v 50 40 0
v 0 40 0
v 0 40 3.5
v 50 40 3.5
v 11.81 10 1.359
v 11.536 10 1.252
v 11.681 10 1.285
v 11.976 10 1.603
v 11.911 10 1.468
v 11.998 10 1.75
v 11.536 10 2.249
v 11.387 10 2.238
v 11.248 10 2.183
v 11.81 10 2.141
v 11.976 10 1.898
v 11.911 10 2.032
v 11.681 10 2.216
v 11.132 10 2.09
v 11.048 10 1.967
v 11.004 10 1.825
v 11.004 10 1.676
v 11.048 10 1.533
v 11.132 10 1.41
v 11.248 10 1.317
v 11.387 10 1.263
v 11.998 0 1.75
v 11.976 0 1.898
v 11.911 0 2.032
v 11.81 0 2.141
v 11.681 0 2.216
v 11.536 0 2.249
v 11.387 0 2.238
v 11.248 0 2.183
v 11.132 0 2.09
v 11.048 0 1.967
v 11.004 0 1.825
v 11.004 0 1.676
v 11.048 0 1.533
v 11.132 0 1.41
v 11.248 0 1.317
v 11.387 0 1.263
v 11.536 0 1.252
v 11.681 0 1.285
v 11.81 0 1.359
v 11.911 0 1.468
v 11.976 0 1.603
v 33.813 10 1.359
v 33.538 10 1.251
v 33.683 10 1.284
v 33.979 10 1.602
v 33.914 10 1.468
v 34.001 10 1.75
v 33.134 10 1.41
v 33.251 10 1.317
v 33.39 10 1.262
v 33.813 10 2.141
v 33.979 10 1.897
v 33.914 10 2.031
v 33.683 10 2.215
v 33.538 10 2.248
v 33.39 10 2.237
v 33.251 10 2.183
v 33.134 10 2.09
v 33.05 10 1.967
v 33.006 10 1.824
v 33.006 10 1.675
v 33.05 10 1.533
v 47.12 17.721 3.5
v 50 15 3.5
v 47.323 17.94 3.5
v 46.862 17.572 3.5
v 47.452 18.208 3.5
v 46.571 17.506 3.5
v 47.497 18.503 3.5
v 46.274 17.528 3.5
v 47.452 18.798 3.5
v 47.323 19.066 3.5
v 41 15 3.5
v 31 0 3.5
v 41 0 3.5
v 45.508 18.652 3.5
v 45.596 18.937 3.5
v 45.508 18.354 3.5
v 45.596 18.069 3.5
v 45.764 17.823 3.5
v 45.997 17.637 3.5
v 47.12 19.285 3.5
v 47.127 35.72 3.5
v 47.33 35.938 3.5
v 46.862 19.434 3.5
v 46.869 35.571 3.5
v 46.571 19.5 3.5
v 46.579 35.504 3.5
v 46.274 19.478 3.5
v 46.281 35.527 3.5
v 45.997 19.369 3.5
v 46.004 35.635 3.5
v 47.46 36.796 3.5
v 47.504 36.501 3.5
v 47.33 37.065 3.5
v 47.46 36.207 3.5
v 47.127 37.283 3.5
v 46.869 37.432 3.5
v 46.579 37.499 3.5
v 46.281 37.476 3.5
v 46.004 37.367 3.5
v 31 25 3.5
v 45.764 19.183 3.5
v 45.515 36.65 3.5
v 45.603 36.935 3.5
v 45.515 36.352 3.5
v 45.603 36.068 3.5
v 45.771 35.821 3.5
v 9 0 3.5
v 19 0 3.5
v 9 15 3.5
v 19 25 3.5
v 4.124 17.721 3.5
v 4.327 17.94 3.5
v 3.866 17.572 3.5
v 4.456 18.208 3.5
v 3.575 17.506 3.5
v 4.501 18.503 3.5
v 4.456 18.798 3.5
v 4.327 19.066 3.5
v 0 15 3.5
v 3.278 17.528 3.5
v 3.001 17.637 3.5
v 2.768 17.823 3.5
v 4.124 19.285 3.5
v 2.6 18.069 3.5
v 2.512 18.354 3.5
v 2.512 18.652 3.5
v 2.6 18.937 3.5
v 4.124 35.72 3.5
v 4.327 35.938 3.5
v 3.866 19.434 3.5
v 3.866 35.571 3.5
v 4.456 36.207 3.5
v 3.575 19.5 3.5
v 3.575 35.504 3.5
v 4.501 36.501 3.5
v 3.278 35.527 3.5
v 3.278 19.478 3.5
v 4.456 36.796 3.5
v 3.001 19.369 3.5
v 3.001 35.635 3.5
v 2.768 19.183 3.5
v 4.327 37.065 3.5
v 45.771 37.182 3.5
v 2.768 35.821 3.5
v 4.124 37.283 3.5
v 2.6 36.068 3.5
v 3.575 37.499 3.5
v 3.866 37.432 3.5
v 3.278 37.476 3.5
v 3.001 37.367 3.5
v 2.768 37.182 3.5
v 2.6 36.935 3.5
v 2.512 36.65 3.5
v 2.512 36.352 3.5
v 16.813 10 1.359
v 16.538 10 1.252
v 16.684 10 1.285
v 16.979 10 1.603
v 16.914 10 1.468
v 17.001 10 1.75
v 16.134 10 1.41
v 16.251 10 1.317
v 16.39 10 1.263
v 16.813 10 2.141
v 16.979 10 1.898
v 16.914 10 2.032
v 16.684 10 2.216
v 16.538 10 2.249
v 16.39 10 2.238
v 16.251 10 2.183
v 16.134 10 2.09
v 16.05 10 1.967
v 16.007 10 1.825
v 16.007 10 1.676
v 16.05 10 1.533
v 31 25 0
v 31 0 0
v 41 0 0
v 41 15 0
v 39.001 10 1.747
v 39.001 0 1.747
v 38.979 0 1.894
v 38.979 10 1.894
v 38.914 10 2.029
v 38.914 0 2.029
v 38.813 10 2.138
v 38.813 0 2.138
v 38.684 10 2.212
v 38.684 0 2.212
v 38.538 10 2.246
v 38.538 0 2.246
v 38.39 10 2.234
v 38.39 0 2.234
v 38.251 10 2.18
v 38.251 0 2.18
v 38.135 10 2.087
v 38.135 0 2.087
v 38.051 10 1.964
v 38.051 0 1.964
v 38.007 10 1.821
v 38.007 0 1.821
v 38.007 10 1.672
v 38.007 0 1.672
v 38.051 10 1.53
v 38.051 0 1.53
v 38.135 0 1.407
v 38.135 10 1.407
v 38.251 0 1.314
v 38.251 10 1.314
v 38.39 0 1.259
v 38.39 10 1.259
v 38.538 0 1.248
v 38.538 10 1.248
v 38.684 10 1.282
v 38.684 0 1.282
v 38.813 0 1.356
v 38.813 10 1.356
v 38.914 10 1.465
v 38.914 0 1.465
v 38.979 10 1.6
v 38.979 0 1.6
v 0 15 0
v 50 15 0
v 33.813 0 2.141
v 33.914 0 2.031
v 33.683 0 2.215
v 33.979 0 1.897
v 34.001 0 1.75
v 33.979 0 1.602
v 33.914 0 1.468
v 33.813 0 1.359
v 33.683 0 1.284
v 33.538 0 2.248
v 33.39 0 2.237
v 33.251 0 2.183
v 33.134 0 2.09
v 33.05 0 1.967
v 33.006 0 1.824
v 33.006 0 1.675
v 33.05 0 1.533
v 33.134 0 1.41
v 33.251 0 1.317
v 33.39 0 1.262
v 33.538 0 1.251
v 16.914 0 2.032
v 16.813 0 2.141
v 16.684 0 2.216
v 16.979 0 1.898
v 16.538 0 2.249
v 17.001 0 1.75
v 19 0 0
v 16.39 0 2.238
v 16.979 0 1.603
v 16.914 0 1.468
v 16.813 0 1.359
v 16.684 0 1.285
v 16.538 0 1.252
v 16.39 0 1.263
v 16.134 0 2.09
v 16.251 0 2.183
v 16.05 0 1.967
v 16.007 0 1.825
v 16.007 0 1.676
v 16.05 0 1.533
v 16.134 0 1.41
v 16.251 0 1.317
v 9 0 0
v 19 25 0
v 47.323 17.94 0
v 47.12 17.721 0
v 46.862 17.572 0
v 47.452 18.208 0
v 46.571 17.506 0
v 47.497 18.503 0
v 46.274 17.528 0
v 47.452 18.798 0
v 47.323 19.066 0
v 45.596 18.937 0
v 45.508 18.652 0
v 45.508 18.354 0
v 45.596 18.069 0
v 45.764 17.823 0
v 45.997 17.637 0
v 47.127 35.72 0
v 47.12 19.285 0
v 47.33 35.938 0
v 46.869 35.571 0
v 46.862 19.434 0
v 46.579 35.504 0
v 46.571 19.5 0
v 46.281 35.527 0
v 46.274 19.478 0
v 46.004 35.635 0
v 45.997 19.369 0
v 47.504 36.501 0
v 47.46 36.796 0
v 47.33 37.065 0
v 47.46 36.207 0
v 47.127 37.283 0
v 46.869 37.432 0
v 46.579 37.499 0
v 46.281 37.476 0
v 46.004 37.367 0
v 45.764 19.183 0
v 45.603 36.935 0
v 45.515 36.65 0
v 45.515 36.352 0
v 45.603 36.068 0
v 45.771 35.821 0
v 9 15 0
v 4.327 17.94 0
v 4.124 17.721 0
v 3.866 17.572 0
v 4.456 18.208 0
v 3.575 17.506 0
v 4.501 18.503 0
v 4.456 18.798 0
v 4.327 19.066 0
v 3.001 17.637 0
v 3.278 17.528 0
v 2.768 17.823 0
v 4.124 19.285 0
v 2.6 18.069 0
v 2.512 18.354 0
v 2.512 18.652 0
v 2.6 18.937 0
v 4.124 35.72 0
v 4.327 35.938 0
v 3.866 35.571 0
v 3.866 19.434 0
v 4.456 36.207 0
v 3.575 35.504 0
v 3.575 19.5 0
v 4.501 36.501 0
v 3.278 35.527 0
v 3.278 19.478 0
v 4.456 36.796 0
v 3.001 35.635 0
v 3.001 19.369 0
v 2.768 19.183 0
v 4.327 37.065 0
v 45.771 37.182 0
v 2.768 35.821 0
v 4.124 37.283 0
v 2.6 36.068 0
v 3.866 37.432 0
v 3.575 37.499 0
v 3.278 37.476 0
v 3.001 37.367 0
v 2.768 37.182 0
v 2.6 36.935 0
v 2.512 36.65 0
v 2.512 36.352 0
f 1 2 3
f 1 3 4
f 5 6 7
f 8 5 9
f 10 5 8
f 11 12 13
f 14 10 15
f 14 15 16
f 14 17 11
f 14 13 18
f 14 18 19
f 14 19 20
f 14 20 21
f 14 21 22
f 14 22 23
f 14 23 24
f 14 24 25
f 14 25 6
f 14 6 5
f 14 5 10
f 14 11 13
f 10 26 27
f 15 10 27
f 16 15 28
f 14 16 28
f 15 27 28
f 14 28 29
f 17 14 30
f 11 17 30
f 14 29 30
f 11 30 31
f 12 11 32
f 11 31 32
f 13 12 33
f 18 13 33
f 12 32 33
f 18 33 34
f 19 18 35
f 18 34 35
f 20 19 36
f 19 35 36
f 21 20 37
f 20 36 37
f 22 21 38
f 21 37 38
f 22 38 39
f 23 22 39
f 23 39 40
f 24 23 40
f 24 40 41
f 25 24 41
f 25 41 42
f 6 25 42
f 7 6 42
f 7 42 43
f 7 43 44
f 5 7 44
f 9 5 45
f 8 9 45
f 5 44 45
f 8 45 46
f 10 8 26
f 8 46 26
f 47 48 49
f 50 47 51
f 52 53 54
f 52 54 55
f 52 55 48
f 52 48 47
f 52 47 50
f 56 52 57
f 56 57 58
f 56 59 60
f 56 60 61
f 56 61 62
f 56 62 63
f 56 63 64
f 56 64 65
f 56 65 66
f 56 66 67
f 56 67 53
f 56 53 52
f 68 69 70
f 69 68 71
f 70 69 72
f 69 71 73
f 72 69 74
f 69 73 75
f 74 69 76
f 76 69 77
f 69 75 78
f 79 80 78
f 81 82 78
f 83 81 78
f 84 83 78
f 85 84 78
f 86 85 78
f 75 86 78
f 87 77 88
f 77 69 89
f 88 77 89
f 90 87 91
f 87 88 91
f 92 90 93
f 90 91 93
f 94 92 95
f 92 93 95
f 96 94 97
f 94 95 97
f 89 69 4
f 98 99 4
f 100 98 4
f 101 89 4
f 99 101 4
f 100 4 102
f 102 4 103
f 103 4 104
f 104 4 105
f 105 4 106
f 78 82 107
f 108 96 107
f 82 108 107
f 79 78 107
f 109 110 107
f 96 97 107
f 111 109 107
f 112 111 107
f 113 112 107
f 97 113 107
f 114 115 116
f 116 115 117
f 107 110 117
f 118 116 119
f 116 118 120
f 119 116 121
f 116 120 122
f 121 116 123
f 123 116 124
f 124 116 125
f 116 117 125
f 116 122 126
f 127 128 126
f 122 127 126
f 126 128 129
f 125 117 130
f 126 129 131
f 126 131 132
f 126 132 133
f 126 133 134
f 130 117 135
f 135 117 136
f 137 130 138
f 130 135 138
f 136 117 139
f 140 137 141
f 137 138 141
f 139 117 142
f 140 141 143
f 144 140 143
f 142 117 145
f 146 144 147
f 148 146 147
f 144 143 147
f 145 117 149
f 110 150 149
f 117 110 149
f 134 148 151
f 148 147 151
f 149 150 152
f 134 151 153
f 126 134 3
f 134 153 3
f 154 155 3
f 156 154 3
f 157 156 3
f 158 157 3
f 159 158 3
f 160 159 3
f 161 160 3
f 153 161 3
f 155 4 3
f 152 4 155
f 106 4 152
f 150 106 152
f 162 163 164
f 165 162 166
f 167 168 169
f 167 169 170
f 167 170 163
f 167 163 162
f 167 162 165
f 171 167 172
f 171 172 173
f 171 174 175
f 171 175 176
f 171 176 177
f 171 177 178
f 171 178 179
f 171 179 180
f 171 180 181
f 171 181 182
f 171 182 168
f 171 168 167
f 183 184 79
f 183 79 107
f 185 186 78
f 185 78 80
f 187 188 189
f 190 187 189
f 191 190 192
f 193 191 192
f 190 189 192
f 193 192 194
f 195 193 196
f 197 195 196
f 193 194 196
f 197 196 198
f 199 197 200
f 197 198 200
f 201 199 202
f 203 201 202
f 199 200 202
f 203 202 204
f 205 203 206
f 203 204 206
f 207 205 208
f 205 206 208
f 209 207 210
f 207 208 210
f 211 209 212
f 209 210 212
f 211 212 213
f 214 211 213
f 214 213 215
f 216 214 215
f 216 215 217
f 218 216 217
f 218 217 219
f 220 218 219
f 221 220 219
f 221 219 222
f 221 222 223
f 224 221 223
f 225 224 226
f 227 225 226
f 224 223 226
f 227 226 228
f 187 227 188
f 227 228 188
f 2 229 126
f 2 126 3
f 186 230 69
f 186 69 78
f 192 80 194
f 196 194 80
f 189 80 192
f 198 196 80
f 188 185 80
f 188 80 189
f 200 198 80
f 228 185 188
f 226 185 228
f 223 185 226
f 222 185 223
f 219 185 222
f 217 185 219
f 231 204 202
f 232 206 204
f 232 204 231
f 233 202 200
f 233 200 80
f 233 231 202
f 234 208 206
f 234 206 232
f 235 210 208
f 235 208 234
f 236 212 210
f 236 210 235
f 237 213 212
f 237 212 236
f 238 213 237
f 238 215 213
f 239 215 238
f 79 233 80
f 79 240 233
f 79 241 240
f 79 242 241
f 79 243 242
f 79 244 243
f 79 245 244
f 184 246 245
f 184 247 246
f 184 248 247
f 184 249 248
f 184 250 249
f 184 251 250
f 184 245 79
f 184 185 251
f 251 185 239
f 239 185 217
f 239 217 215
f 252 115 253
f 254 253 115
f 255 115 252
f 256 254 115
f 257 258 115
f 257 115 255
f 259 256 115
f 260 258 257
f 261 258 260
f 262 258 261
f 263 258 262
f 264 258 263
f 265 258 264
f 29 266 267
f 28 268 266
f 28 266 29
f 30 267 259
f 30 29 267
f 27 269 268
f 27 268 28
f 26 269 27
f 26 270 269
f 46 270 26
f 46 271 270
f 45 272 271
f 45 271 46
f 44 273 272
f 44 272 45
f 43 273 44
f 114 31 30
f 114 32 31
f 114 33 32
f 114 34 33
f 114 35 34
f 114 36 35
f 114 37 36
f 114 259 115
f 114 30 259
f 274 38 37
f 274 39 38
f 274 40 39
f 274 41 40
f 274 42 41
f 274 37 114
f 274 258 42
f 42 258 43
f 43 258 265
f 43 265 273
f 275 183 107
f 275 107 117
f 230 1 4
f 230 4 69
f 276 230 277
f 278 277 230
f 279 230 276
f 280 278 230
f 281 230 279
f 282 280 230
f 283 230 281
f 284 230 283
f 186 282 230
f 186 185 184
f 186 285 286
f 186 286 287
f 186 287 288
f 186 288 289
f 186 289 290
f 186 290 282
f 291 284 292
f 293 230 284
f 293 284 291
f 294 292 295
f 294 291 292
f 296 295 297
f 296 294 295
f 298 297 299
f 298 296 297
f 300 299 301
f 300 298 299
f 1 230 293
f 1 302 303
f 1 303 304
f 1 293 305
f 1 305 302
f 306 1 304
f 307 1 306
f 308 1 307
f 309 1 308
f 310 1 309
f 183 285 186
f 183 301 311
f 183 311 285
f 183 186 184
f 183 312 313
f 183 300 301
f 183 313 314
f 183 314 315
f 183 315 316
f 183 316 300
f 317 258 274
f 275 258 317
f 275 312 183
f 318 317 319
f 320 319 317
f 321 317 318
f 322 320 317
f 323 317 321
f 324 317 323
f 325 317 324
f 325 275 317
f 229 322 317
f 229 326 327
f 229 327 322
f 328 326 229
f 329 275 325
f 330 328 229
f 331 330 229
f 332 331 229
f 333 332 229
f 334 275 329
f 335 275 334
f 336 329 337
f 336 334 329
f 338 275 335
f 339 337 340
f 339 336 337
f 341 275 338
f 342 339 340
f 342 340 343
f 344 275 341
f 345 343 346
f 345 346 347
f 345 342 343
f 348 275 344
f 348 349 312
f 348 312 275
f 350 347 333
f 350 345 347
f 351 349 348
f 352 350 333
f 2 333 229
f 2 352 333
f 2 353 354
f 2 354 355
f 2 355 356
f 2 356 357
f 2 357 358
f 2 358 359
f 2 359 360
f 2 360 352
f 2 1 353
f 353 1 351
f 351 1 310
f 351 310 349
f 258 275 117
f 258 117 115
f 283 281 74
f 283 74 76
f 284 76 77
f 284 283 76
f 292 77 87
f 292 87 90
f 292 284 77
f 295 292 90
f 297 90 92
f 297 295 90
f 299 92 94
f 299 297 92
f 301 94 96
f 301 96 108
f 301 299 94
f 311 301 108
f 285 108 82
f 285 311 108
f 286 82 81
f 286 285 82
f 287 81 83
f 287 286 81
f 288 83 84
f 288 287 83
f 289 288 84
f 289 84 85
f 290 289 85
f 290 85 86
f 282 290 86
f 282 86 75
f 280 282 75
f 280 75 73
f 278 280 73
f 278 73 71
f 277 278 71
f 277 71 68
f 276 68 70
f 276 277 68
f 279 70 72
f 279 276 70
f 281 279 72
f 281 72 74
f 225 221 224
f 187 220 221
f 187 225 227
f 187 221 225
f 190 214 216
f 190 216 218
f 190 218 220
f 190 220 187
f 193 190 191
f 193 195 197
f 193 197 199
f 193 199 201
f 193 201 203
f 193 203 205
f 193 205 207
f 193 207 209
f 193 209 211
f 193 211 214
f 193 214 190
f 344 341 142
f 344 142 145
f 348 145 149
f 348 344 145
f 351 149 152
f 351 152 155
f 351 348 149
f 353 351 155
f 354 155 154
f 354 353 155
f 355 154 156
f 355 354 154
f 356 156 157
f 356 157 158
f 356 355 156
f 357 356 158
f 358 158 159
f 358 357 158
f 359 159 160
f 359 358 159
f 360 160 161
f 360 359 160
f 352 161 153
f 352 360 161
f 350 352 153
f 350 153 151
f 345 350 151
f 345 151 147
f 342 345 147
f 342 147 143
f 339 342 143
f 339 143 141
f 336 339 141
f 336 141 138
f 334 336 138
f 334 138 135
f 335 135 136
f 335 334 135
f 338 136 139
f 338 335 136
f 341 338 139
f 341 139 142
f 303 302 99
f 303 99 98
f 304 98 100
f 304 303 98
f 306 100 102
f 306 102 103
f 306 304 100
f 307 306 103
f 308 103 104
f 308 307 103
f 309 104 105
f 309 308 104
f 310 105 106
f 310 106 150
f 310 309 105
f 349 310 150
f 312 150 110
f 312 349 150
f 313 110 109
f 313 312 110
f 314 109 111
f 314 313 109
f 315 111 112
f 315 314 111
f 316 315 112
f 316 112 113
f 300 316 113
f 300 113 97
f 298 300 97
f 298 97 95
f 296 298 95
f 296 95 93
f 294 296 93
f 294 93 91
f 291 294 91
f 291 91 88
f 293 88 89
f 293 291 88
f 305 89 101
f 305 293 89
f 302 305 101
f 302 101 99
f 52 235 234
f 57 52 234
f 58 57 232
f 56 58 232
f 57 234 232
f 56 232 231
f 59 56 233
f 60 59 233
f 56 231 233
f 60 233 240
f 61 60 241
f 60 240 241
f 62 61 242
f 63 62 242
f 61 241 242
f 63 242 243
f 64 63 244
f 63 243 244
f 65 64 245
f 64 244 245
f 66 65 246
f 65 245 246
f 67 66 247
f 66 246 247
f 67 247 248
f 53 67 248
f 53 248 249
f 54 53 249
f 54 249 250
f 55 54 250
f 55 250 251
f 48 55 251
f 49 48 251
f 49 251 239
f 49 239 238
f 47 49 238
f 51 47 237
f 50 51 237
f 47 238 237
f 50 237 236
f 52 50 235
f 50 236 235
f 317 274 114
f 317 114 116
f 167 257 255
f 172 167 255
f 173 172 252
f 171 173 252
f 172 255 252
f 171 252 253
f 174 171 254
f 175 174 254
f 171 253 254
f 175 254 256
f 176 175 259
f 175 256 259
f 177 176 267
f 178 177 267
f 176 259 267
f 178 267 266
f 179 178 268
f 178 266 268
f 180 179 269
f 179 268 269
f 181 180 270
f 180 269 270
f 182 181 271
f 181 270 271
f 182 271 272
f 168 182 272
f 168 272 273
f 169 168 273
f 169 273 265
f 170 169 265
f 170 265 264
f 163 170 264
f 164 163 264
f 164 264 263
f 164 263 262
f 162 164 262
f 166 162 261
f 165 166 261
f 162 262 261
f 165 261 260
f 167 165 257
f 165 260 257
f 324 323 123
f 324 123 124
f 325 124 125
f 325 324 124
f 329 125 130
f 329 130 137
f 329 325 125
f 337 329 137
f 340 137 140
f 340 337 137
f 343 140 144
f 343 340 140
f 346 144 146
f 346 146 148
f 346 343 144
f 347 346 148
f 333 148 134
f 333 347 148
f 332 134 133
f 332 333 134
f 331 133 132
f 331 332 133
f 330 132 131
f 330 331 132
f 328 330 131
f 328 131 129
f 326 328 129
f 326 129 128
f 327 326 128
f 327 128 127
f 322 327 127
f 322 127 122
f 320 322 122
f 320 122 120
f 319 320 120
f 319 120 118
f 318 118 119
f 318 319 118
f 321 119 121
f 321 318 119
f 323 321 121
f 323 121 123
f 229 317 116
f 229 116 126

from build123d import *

# Parameters (mm, degrees)
SKETCH001_R  = 1
PAD_DEPTH    = 3.5
SKETCH002_R  = 0.5
POCKET_DEPTH = 10


with BuildPart() as part:
    # Sketch001 → Pad (new body)
    with BuildSketch(Plane.XY):
        Polygon((9, 0), (9, 15), (0, 15), (0, 40), (50, 40), (50, 15), (41, 15), (41, 0), (31, 0), (31, 25), (19, 25), (19, 0), align=None)
        with Locations((46.504002, 36.501442)):
            Circle(SKETCH001_R, mode=Mode.SUBTRACT)
        with Locations((3.500559, 36.501442)):
            Circle(SKETCH001_R, mode=Mode.SUBTRACT)
        with Locations((3.500559, 18.503159)):
            Circle(SKETCH001_R, mode=Mode.SUBTRACT)
        with Locations((46.496666, 18.503159)):
            Circle(SKETCH001_R, mode=Mode.SUBTRACT)
    extrude(amount=PAD_DEPTH)

    # Sketch002 (on Face9 of Pad) → Pocket (cut)
    with BuildSketch(Plane.XZ):
        with Locations((38.501091, 1.746948)):
            Circle(SKETCH002_R)
        with Locations((33.500816, 1.749735)):
            Circle(SKETCH002_R)
        with Locations((16.500931, 1.75016)):
            Circle(SKETCH002_R)
        with Locations((11.498322, 1.75016)):
            Circle(SKETCH002_R)
    extrude(amount=-POCKET_DEPTH, mode=Mode.SUBTRACT)


solid = part.part
